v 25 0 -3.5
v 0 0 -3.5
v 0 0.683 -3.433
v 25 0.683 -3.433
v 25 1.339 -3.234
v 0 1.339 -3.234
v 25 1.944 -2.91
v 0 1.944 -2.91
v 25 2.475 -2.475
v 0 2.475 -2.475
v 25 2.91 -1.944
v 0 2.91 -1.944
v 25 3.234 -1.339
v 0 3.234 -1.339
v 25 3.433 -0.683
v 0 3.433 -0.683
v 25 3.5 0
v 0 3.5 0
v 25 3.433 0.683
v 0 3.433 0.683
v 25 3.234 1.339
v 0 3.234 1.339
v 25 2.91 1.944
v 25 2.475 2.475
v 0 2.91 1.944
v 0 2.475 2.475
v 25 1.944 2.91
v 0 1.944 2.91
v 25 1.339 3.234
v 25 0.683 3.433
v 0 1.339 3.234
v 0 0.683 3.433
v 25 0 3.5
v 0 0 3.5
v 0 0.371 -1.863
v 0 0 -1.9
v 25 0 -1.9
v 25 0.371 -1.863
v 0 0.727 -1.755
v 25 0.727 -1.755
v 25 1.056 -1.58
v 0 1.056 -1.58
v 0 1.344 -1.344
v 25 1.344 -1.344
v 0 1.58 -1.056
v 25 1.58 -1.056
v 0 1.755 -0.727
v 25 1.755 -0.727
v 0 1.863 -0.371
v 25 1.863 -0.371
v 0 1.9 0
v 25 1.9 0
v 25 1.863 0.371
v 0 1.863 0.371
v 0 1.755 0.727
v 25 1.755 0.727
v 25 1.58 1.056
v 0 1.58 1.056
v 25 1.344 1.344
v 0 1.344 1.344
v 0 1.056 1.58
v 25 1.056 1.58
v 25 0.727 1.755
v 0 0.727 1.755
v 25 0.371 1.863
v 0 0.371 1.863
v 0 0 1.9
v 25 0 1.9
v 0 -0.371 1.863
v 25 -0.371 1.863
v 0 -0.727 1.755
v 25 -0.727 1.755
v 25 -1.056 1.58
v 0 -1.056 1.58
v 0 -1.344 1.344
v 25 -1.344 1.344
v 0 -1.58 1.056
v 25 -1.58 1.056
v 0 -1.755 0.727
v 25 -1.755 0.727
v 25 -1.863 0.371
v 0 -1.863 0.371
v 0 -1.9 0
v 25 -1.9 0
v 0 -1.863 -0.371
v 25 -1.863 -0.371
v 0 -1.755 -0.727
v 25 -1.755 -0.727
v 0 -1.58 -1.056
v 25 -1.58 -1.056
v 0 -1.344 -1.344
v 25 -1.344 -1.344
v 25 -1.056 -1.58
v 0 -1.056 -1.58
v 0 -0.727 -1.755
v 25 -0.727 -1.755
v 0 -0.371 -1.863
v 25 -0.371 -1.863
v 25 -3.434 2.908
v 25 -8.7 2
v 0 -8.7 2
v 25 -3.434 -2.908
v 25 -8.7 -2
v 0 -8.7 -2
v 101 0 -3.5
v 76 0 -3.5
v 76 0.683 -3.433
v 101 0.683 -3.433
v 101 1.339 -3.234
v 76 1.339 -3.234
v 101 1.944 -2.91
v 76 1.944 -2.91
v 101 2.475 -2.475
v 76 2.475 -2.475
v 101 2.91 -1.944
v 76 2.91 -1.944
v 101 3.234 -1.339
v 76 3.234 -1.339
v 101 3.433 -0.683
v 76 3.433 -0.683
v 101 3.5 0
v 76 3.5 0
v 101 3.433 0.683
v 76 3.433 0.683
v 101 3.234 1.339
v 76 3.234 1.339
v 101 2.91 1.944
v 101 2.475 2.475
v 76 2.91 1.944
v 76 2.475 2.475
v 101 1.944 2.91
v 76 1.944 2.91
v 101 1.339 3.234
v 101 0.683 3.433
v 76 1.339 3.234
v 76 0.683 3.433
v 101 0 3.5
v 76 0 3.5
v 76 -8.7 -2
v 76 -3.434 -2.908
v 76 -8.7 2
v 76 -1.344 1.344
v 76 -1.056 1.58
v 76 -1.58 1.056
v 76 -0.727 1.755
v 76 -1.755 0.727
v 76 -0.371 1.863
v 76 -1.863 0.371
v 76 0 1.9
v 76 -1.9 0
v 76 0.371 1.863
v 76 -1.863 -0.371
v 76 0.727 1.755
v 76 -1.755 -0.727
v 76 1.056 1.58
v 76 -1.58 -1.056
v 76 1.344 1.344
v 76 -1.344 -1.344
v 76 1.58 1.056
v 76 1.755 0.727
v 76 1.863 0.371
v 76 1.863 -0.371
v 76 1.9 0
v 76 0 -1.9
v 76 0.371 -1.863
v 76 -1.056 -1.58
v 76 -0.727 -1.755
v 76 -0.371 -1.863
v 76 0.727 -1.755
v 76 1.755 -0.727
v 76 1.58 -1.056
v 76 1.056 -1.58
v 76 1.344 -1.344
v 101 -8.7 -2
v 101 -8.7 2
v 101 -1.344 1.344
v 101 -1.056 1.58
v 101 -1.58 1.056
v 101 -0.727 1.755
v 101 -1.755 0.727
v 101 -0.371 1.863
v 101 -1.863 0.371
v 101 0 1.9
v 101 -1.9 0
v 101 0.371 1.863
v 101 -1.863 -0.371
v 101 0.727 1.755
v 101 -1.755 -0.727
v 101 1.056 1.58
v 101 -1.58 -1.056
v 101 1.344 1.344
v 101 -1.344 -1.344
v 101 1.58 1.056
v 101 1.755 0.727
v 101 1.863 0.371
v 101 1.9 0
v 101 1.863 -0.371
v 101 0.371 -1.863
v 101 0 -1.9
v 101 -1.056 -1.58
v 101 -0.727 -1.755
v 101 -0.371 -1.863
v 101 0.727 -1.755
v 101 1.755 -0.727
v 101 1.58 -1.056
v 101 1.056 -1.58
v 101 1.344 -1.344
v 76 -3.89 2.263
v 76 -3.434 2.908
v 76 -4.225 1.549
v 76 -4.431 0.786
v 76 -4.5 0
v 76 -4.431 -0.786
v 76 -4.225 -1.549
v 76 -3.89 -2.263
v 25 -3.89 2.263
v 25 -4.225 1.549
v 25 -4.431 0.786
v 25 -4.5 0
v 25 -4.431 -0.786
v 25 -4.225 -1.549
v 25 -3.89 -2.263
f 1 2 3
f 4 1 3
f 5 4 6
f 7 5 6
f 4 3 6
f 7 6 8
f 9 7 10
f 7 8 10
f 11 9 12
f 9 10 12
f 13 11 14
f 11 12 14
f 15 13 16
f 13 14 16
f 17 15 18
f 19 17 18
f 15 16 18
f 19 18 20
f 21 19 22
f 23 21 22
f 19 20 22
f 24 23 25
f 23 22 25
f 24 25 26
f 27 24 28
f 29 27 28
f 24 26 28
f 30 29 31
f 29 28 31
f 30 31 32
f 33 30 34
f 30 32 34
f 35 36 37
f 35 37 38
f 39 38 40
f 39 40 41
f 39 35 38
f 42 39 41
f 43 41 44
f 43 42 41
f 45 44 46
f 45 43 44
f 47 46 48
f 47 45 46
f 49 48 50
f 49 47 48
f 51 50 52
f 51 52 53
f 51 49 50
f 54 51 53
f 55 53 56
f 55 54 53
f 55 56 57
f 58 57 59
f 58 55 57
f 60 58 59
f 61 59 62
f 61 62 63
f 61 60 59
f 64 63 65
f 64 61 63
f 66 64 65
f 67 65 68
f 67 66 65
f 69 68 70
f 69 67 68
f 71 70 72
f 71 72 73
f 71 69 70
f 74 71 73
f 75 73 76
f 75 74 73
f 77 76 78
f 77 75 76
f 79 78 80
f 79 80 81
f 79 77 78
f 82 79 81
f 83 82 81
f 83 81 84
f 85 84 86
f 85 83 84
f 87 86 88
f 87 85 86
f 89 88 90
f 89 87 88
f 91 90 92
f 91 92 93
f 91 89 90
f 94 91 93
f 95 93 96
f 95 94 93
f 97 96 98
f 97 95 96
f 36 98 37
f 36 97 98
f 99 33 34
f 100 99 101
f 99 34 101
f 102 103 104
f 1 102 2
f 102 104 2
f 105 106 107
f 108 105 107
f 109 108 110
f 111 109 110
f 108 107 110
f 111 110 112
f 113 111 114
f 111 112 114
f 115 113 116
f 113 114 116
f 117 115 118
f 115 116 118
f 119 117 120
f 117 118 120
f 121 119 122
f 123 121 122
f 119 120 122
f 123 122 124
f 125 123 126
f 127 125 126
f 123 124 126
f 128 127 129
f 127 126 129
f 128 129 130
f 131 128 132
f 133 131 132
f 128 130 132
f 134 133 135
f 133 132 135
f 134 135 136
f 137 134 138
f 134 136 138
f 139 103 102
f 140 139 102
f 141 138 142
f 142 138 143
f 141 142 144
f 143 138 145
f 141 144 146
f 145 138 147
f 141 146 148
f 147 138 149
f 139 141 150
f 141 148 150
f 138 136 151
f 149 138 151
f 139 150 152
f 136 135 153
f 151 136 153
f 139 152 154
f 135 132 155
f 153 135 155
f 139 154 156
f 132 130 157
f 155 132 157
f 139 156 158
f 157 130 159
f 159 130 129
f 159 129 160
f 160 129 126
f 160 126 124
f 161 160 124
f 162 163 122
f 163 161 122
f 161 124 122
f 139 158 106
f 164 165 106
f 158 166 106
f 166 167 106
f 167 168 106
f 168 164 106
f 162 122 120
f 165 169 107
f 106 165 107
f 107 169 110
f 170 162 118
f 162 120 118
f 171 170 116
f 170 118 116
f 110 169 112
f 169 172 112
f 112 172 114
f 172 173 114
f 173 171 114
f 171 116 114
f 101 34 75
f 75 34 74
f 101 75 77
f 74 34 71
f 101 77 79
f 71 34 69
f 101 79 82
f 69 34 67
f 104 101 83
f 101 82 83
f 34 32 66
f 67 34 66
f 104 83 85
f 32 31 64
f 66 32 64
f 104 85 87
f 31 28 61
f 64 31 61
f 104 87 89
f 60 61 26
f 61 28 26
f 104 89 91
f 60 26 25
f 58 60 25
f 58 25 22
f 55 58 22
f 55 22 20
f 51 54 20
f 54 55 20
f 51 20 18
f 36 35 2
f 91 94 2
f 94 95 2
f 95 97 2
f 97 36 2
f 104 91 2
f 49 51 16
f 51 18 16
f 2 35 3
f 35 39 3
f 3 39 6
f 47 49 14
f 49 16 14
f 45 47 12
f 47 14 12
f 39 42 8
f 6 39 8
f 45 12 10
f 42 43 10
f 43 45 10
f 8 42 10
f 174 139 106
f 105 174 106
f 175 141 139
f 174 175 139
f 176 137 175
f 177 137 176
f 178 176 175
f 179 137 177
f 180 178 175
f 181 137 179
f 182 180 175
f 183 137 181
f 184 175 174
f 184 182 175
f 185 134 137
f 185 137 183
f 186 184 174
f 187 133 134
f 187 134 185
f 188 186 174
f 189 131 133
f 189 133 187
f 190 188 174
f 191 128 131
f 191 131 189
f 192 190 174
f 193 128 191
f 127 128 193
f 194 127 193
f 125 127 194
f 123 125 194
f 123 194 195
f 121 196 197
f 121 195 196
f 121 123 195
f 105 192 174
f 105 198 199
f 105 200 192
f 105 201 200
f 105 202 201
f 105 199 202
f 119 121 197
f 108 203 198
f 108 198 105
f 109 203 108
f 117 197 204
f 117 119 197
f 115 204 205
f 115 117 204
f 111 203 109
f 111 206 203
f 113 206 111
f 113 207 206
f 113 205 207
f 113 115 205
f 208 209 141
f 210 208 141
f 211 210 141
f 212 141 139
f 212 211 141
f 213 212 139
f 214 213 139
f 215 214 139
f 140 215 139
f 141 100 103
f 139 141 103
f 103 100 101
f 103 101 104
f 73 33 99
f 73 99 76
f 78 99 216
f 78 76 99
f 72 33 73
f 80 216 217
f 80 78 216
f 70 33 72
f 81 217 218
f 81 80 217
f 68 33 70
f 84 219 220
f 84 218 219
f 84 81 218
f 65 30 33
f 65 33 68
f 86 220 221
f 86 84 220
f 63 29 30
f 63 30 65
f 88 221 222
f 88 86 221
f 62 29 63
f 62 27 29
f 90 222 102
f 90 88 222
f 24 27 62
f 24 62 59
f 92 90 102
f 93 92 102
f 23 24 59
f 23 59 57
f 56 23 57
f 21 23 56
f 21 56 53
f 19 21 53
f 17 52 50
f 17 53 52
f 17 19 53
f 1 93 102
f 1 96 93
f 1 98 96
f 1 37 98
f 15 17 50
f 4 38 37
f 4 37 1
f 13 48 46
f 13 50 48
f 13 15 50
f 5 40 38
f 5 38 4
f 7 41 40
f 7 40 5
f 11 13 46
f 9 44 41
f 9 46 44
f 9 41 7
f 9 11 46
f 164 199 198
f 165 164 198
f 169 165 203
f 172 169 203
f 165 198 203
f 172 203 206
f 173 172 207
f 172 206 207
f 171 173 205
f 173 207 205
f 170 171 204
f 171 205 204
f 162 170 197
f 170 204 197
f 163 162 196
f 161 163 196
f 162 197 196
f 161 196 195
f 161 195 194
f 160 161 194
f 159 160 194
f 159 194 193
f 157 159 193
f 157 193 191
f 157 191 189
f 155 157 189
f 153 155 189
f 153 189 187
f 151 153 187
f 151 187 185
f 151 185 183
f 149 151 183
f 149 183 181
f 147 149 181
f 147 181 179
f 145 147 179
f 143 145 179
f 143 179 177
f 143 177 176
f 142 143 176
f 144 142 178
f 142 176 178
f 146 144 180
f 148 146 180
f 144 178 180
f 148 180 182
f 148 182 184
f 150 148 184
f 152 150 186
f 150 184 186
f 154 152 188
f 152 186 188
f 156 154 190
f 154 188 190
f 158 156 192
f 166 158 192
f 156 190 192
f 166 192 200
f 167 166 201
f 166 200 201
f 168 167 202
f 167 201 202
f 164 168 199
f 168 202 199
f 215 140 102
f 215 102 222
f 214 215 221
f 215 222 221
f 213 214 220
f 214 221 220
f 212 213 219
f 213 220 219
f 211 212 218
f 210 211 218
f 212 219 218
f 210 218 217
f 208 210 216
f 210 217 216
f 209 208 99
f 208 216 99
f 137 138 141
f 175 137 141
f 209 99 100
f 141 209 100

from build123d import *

# Parameters (mm, degrees)
SKETCH1_R           = 1.9
BOSS_EXTRUDE1_DEPTH = 25
BOSS_EXTRUDE2_DEPTH = 51
SKETCH3_R           = 1.51
BOSS_EXTRUDE3_DEPTH = 25
SKETCH7_R           = 1.9
CUT_EXTRUDE4_DEPTH  = 102


with BuildPart() as part:
    # Sketch1 → Boss-Extrude1 (new body)
    with BuildSketch(Plane(origin=(0, 0, 0), x_dir=(0, 0, -1), z_dir=(1, 0, 0))):
        with BuildLine():
            Line((2, -8.7), (3.5, 0))
            ThreePointArc((3.5, 0), (0, 3.5), (-3.5, 0))
            Line((-3.5, 0), (-2, -8.7))
            Line((-2, -8.7), (2, -8.7))
        make_face()
        Circle(SKETCH1_R, mode=Mode.SUBTRACT)
    extrude(amount=BOSS_EXTRUDE1_DEPTH)

    # Sketch2 → Boss-Extrude2 (add)
    with BuildSketch(Plane(origin=(25, 0, 0), x_dir=(0, 0, -1), z_dir=(1, 0, 0))):
        with BuildLine():
            Line((-2, -8.7), (2, -8.7))
            Line((2, -8.7), (2.907884559, -3.434269557))
            ThreePointArc((2.907884559, -3.434269557), (0, -4.5), (-2.907884559, -3.434269557))
            Line((-2.907884559, -3.434269557), (-2, -8.7))
        make_face()
    extrude(amount=BOSS_EXTRUDE2_DEPTH)


with BuildPart() as body_2:
    # Sketch3 → Boss-Extrude3 (new body)
    with BuildSketch(Plane(origin=(76, 0, 0), x_dir=(0, 0, -1), z_dir=(1, 0, 0))):
        with BuildLine():
            Line((-3.5, 0), (-2, -8.7))
            Line((-2, -8.7), (2, -8.7))
            Line((2, -8.7), (3.5, 0))
            ThreePointArc((3.5, 0), (0, 3.5), (-3.5, 0))
        make_face()
        Circle(SKETCH3_R, mode=Mode.SUBTRACT)
    extrude(amount=BOSS_EXTRUDE3_DEPTH)

    # Sketch7 → Cut-Extrude4 (cut, through all)
    with BuildSketch(Plane(origin=(101, 0, 0), x_dir=(0, 0, -1), z_dir=(1, 0, 0))):
        Circle(SKETCH7_R)
    extrude(amount=-CUT_EXTRUDE4_DEPTH, mode=Mode.SUBTRACT)


solid = Compound([part.part, body_2.part])
